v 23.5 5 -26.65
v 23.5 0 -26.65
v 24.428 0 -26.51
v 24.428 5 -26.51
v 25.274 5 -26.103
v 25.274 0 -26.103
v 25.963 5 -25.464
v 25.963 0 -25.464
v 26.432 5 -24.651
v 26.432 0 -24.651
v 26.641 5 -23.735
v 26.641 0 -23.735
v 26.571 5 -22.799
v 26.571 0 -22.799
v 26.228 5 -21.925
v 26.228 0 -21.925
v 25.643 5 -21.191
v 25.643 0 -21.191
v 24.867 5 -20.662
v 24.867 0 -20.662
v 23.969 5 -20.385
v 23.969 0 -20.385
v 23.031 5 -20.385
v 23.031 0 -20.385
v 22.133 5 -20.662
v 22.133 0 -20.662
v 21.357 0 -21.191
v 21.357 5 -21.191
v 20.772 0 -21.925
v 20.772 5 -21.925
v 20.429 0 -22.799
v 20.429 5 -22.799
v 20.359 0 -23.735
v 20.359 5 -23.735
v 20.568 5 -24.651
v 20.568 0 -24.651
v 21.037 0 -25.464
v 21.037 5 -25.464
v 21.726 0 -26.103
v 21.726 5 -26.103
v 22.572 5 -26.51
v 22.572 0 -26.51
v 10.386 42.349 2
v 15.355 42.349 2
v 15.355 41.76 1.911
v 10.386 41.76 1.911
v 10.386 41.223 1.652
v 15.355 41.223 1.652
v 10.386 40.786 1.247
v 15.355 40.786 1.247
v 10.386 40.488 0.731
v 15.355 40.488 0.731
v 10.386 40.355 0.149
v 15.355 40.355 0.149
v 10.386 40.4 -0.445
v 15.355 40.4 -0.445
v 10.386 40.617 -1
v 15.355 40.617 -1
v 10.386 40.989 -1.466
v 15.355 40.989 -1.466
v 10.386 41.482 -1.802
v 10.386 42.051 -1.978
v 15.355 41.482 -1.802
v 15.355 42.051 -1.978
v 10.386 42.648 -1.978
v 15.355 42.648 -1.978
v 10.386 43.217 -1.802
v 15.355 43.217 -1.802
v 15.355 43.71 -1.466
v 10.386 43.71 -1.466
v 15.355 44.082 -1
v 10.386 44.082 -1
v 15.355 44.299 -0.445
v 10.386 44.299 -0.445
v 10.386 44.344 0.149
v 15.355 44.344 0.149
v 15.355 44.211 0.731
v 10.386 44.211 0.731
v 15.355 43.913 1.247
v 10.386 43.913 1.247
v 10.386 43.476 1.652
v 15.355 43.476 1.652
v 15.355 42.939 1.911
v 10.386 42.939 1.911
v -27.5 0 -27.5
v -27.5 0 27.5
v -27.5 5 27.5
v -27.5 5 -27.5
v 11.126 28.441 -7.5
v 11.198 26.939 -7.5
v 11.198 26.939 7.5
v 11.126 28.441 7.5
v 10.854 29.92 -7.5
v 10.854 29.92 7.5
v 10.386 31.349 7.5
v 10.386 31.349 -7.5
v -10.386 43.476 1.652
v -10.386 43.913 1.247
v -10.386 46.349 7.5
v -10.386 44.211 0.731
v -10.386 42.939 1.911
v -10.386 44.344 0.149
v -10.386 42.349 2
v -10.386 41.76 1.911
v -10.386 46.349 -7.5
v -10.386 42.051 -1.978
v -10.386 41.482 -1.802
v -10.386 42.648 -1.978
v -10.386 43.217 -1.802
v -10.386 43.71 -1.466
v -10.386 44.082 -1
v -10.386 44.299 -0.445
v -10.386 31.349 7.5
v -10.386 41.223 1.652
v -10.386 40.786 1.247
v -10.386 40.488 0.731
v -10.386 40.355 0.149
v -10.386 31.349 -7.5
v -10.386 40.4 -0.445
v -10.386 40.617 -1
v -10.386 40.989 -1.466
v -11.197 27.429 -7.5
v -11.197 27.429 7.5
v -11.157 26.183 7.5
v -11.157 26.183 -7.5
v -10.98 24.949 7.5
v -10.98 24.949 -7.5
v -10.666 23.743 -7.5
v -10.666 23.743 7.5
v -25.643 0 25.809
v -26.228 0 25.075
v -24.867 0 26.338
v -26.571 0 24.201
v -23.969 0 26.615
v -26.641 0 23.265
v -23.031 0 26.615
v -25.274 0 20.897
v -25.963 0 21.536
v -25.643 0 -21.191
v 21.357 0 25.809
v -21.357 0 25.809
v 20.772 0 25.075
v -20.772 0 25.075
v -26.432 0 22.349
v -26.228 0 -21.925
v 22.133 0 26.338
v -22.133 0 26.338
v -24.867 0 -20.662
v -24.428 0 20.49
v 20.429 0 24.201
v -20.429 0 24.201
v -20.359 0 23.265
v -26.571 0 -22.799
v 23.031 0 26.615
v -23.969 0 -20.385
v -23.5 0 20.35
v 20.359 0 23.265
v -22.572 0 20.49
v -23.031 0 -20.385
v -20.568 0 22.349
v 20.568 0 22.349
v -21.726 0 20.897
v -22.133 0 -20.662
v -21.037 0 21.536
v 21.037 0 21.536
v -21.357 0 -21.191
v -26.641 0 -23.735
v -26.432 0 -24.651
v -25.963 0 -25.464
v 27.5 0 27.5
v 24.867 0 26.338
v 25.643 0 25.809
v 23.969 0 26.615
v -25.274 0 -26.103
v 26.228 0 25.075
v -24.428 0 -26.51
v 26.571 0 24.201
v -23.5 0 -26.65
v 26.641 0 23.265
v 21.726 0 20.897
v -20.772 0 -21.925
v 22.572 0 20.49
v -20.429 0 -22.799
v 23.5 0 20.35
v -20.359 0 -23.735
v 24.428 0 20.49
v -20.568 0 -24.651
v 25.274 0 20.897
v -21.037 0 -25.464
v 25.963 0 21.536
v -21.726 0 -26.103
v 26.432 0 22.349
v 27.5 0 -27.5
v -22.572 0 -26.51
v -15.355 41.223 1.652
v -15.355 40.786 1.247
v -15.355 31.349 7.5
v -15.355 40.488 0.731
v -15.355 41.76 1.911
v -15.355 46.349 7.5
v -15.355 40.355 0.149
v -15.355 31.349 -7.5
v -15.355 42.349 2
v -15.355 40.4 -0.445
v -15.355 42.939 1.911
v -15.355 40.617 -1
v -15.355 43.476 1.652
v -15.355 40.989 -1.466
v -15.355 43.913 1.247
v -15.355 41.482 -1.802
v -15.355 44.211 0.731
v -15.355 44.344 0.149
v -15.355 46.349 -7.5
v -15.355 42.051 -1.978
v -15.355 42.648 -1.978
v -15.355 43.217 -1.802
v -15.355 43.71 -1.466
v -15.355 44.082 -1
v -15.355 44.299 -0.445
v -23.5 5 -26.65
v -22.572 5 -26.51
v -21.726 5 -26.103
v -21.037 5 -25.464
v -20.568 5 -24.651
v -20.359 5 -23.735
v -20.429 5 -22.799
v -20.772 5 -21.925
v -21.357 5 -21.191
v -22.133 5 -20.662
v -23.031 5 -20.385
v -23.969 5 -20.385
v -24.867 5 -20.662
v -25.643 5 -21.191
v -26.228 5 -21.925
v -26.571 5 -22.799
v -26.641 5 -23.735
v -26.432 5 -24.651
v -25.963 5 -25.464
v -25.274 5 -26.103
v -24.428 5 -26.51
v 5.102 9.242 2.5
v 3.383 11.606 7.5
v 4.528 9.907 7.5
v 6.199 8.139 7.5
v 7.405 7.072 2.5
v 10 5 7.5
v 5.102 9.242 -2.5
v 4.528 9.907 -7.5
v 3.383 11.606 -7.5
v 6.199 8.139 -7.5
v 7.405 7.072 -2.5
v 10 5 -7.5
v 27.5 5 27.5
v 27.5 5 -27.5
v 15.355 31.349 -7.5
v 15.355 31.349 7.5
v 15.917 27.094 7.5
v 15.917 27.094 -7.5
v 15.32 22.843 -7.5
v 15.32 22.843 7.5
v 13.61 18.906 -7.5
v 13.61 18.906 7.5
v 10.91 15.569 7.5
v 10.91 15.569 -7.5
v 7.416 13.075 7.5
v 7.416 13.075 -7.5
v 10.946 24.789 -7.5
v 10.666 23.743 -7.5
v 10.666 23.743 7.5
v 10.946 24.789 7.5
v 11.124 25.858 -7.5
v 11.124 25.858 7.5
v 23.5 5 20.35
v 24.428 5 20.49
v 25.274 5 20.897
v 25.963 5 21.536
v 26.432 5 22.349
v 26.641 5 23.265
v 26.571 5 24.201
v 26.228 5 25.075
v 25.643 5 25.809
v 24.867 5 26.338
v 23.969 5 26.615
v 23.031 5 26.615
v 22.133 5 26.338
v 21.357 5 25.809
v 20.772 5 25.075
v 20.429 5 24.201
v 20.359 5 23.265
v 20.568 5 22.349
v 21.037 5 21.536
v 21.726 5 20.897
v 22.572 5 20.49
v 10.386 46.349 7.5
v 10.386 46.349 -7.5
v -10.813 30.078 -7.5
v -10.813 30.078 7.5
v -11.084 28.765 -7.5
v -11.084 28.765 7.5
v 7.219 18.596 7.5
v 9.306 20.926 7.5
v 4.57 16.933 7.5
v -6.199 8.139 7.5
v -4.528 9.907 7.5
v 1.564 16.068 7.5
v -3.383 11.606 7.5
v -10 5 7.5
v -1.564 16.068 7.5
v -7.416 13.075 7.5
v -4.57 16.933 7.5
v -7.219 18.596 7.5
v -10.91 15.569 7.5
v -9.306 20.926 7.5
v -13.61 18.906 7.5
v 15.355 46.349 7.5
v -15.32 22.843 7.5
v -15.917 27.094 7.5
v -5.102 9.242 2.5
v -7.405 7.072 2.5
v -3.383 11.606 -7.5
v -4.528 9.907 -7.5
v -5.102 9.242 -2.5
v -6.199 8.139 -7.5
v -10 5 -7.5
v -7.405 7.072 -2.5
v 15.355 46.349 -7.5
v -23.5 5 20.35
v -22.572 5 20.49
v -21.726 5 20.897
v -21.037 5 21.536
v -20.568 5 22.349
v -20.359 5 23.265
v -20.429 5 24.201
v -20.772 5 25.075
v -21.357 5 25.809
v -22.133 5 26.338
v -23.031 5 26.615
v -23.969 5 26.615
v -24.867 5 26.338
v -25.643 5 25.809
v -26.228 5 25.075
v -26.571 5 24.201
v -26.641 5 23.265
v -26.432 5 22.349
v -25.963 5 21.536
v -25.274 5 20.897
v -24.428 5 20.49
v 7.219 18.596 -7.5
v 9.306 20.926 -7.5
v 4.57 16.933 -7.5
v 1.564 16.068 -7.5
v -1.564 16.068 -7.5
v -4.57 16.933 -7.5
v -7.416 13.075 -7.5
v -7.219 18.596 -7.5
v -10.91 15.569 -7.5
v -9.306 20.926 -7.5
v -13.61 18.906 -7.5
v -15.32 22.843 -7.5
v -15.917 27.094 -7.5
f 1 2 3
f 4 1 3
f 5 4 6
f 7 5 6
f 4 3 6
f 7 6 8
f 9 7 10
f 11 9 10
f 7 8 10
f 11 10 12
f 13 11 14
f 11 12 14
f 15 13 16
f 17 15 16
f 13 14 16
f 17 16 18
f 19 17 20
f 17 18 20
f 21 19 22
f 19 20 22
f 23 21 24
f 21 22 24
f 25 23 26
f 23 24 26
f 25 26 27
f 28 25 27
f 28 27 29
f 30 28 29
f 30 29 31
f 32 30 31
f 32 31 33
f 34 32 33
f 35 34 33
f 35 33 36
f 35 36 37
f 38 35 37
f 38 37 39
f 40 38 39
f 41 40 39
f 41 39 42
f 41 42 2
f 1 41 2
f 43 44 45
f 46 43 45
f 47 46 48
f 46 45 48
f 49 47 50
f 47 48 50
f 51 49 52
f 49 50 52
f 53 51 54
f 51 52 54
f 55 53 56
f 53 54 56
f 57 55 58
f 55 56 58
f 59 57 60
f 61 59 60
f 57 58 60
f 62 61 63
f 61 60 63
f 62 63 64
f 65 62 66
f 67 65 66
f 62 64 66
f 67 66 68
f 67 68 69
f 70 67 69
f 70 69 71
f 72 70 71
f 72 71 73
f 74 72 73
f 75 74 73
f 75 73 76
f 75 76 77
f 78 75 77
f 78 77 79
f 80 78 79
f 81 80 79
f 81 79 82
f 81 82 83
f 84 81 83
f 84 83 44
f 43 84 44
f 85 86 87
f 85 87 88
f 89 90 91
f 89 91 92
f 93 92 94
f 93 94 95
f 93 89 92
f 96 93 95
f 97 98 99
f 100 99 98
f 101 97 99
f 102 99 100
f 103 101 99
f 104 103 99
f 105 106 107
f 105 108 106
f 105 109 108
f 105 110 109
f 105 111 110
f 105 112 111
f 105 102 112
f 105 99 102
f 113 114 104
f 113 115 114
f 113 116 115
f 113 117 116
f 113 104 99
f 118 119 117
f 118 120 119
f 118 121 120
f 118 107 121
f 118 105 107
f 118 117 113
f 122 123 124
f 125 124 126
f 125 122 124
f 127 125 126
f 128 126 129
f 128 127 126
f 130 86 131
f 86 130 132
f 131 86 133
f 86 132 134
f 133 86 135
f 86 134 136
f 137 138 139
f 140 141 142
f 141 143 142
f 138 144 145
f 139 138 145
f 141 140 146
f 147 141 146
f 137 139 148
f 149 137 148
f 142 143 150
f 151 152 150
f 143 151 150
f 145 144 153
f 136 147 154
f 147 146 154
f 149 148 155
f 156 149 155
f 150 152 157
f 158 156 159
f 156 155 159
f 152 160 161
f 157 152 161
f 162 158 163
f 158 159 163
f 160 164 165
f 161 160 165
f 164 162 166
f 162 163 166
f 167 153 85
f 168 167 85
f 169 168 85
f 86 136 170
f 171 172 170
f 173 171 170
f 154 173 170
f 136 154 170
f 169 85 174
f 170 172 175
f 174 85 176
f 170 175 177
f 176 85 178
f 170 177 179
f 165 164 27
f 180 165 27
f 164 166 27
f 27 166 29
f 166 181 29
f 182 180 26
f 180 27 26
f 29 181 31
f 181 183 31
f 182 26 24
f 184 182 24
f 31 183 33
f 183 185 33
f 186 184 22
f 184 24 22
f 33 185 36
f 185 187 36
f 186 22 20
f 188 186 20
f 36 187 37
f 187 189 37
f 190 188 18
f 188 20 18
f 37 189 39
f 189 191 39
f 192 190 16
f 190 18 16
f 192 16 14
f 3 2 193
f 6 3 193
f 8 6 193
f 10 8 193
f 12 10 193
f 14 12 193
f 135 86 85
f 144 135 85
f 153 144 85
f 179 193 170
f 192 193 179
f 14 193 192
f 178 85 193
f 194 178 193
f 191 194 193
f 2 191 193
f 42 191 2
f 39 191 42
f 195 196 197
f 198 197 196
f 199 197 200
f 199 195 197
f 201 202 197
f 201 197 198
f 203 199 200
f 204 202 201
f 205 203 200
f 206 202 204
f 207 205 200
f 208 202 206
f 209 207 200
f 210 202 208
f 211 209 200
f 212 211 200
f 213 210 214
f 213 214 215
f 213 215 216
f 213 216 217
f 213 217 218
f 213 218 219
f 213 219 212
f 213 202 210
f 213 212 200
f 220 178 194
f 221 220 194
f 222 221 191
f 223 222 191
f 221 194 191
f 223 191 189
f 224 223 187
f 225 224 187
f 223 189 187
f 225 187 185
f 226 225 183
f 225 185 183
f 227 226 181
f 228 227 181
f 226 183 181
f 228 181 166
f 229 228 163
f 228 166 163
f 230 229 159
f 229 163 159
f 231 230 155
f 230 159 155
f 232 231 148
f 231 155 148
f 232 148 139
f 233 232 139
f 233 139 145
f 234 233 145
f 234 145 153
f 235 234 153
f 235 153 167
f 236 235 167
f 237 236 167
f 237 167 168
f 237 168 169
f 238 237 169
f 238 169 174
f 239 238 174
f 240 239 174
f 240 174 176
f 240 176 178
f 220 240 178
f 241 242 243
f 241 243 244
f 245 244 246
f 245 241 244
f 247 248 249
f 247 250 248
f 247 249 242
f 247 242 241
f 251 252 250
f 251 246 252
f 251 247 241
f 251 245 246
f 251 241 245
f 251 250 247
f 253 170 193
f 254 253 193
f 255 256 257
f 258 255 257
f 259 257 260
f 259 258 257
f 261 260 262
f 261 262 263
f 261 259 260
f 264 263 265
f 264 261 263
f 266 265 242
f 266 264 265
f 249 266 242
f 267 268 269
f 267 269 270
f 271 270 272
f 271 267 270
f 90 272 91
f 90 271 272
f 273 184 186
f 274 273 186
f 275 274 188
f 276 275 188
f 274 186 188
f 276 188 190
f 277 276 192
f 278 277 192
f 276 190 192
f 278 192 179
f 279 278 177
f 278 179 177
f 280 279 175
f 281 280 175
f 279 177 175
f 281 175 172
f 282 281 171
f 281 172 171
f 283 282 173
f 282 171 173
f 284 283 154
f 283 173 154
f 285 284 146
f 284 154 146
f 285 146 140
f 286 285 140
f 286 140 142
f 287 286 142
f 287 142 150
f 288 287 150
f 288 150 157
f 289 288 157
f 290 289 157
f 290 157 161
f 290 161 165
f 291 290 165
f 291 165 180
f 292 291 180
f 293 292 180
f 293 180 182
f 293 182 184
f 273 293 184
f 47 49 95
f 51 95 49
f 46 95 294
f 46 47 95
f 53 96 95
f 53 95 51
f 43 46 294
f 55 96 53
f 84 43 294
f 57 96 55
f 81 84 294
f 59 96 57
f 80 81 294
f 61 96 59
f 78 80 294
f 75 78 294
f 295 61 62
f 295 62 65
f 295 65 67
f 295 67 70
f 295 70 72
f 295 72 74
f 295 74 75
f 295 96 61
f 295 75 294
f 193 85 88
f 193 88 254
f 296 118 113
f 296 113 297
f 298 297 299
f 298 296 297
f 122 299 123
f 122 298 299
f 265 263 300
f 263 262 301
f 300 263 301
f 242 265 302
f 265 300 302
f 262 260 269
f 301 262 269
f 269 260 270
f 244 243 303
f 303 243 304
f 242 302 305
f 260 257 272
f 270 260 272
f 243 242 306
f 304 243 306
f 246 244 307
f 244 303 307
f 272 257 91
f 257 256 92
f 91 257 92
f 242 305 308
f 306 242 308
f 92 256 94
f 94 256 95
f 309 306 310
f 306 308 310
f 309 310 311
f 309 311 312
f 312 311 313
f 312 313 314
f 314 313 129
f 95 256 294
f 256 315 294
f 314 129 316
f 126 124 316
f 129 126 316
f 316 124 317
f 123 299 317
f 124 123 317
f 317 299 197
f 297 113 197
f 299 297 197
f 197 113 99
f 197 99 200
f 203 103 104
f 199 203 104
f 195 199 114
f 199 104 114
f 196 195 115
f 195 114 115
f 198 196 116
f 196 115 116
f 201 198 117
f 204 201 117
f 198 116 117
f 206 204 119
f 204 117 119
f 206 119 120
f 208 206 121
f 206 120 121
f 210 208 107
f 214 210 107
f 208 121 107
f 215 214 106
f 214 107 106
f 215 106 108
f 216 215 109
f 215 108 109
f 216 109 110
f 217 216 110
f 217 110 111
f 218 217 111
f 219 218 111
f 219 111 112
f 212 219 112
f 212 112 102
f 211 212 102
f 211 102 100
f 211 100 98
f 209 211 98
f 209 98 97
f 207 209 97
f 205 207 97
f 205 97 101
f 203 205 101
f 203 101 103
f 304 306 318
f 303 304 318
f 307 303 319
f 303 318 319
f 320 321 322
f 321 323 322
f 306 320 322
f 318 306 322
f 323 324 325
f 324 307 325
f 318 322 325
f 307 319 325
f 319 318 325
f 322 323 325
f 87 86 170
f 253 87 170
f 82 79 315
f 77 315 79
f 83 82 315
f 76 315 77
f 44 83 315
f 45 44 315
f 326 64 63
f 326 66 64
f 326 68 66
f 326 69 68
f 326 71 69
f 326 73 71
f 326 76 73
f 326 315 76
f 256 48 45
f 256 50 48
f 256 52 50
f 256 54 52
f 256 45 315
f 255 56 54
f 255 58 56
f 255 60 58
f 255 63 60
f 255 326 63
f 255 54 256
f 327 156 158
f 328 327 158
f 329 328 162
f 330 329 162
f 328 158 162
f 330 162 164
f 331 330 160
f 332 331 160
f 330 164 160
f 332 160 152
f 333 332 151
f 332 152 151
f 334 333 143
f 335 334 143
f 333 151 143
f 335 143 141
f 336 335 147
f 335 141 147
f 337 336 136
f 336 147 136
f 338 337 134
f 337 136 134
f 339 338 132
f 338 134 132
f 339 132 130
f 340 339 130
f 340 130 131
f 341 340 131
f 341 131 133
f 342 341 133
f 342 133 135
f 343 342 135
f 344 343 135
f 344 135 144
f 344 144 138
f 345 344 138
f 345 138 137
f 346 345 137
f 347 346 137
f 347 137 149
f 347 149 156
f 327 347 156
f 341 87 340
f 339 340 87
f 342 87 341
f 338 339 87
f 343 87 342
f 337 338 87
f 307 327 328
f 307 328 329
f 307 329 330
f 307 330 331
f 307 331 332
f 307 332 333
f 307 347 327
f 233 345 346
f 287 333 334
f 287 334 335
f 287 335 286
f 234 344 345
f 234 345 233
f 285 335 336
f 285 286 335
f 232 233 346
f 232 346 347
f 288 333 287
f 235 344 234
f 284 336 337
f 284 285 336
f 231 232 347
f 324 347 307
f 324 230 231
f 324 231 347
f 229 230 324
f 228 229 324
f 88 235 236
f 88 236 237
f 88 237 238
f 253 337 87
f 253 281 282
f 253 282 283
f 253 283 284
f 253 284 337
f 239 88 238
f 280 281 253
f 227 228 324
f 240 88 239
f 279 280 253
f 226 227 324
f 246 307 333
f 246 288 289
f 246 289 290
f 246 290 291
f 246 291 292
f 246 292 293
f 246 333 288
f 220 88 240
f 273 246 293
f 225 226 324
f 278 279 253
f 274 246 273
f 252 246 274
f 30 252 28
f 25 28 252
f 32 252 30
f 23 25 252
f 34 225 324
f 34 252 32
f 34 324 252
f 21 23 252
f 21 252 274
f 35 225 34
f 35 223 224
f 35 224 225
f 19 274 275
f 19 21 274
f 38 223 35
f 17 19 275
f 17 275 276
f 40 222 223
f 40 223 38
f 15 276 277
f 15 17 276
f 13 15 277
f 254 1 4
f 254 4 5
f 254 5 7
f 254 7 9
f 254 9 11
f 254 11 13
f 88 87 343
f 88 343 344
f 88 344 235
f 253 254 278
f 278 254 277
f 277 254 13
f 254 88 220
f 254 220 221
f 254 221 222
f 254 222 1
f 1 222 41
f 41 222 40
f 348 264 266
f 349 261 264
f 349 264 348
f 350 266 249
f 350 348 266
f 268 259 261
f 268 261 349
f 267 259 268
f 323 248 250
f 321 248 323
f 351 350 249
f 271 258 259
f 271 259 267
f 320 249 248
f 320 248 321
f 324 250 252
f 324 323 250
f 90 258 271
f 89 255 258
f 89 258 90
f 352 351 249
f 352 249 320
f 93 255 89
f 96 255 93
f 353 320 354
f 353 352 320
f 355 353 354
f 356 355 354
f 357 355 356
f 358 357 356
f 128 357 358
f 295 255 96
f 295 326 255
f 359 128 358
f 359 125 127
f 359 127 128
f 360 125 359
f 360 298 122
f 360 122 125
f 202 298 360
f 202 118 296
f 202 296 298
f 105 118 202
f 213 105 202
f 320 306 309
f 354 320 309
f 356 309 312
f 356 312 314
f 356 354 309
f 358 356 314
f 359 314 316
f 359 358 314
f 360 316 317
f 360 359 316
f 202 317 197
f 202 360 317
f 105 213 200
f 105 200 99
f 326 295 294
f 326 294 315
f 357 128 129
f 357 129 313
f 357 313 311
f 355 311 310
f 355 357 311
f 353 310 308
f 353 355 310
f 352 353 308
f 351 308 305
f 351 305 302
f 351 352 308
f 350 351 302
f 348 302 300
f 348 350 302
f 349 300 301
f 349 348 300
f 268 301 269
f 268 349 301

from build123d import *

# Parameters (mm, degrees)
SKETCH1_W           = 55
SKETCH1_H           = 55
BOSS_EXTRUDE1_DEPTH = 5
LOFT1_START         = -7.5
LOFT1_DEPTH         = 15
SKETCH7_R           = 3.15
CUT_EXTRUDE1_DEPTH  = 42.683330037
BOSS_EXTRUDE2_DEPTH = 15
SKETCH10_R          = 2
CUT_EXTRUDE2_DEPTH  = 69.855497331


# Read off the part's stored shape, not the designer's step: Loft1
with BuildPart() as part:
    # Sketch1 → Boss-Extrude1 (new body)
    with BuildSketch(Plane(origin=(0, 0, 0), x_dir=(1, 0, 0), z_dir=(0, 1, 0))):
        Rectangle(SKETCH1_W, SKETCH1_H)
    extrude(amount=BOSS_EXTRUDE1_DEPTH)

    # Loft1 outline → Loft1 (add)
    with BuildSketch(Plane.XY.offset(LOFT1_START)):
        with BuildLine():
            add(Edge.make_bspline(
                [(2.5, 15), (2.5, 10.833333333), (6.25, 7.916666667), (10, 5)],
                knots=[0, 0, 0, 0, 1, 1, 1, 1], degree=3))
            Line((2.5, 15), (-2.5, 15))
            add(Edge.make_bspline(
                [(-2.5, 15), (-2.5, 10.833333333), (-6.25, 7.916666667), (-10, 5)],
                knots=[0, 0, 0, 0, 1, 1, 1, 1], degree=3))
            Line((-10, 5), (10, 5))
        make_face()
    extrude(amount=LOFT1_DEPTH)

    # Sketch7 → Cut-Extrude1 (cut, through all)
    with BuildSketch(Plane(origin=(0, 0, 0), x_dir=(-1, 0, 0), z_dir=(0, -1, 0))):
        with Locations(Location((23.5, -23.5, 0), (0, 0, 90))):
            Circle(SKETCH7_R)
        with Locations(Location((-23.5, -23.5, 0), (0, 0, 90))):
            Circle(SKETCH7_R)
        with Locations(Location((-23.5, 23.5, 0), (0, 0, 90))):
            Circle(SKETCH7_R)
        with Locations(Location((23.5, 23.5, 0), (0, 0, 90))):
            Circle(SKETCH7_R)
    extrude(amount=-CUT_EXTRUDE1_DEPTH, mode=Mode.SUBTRACT)

    # Sketch8 → Boss-Extrude2 (add)
    with BuildSketch(Plane(origin=(0, 0, -7.5), x_dir=(-1, 0, 0), z_dir=(0, 0, -1))):
        with BuildLine():
            Line((-10.386332084, 31.349499896), (-10.386332084, 46.349499896))
            Line((-10.386332084, 46.349499896), (-15.355027277, 46.349499896))
            Line((-15.355027277, 46.349499896), (-15.355027277, 31.349499896))
            ThreePointArc((-15.355027277, 31.349499896), (0, 11.24185629), (15.355027277, 31.349499896))
            Line((15.355027277, 31.349499896), (15.355027277, 46.349499896))
            Line((15.355027277, 46.349499896), (10.386332084, 46.349499896))
            Line((10.386332084, 46.349499896), (10.386332084, 31.349499896))
            ThreePointArc((10.386332084, 31.349499896), (10.968139681, 29.425682042), (11.196737575, 27.428855004))
            ThreePointArc((11.196737575, 27.428855004), (11.085843409, 25.563528692), (10.666364419, 23.742601142))
            ThreePointArc((10.666364419, 23.742601142), (0, 15.958544655), (-10.666364419, 23.742601142))
            ThreePointArc((-10.666364419, 23.742601142), (-11.048273693, 25.321250886), (-11.197838961, 26.93853872))
            ThreePointArc((-11.197838961, 26.93853872), (-11.015137518, 29.185055314), (-10.386332084, 31.349499896))
        make_face()
    extrude(amount=-BOSS_EXTRUDE2_DEPTH)

    # Sketch10 → Cut-Extrude2 (cut, through all)
    with BuildSketch(Plane(origin=(15.355027277, 0, 0), x_dir=(0, 0, -1), z_dir=(1, 0, 0))):
        with Locations(Location((0, 42.349499896, 0), (0, 0, 180))):
            Circle(SKETCH10_R)
    extrude(amount=-CUT_EXTRUDE2_DEPTH, mode=Mode.SUBTRACT)


solid = part.part
